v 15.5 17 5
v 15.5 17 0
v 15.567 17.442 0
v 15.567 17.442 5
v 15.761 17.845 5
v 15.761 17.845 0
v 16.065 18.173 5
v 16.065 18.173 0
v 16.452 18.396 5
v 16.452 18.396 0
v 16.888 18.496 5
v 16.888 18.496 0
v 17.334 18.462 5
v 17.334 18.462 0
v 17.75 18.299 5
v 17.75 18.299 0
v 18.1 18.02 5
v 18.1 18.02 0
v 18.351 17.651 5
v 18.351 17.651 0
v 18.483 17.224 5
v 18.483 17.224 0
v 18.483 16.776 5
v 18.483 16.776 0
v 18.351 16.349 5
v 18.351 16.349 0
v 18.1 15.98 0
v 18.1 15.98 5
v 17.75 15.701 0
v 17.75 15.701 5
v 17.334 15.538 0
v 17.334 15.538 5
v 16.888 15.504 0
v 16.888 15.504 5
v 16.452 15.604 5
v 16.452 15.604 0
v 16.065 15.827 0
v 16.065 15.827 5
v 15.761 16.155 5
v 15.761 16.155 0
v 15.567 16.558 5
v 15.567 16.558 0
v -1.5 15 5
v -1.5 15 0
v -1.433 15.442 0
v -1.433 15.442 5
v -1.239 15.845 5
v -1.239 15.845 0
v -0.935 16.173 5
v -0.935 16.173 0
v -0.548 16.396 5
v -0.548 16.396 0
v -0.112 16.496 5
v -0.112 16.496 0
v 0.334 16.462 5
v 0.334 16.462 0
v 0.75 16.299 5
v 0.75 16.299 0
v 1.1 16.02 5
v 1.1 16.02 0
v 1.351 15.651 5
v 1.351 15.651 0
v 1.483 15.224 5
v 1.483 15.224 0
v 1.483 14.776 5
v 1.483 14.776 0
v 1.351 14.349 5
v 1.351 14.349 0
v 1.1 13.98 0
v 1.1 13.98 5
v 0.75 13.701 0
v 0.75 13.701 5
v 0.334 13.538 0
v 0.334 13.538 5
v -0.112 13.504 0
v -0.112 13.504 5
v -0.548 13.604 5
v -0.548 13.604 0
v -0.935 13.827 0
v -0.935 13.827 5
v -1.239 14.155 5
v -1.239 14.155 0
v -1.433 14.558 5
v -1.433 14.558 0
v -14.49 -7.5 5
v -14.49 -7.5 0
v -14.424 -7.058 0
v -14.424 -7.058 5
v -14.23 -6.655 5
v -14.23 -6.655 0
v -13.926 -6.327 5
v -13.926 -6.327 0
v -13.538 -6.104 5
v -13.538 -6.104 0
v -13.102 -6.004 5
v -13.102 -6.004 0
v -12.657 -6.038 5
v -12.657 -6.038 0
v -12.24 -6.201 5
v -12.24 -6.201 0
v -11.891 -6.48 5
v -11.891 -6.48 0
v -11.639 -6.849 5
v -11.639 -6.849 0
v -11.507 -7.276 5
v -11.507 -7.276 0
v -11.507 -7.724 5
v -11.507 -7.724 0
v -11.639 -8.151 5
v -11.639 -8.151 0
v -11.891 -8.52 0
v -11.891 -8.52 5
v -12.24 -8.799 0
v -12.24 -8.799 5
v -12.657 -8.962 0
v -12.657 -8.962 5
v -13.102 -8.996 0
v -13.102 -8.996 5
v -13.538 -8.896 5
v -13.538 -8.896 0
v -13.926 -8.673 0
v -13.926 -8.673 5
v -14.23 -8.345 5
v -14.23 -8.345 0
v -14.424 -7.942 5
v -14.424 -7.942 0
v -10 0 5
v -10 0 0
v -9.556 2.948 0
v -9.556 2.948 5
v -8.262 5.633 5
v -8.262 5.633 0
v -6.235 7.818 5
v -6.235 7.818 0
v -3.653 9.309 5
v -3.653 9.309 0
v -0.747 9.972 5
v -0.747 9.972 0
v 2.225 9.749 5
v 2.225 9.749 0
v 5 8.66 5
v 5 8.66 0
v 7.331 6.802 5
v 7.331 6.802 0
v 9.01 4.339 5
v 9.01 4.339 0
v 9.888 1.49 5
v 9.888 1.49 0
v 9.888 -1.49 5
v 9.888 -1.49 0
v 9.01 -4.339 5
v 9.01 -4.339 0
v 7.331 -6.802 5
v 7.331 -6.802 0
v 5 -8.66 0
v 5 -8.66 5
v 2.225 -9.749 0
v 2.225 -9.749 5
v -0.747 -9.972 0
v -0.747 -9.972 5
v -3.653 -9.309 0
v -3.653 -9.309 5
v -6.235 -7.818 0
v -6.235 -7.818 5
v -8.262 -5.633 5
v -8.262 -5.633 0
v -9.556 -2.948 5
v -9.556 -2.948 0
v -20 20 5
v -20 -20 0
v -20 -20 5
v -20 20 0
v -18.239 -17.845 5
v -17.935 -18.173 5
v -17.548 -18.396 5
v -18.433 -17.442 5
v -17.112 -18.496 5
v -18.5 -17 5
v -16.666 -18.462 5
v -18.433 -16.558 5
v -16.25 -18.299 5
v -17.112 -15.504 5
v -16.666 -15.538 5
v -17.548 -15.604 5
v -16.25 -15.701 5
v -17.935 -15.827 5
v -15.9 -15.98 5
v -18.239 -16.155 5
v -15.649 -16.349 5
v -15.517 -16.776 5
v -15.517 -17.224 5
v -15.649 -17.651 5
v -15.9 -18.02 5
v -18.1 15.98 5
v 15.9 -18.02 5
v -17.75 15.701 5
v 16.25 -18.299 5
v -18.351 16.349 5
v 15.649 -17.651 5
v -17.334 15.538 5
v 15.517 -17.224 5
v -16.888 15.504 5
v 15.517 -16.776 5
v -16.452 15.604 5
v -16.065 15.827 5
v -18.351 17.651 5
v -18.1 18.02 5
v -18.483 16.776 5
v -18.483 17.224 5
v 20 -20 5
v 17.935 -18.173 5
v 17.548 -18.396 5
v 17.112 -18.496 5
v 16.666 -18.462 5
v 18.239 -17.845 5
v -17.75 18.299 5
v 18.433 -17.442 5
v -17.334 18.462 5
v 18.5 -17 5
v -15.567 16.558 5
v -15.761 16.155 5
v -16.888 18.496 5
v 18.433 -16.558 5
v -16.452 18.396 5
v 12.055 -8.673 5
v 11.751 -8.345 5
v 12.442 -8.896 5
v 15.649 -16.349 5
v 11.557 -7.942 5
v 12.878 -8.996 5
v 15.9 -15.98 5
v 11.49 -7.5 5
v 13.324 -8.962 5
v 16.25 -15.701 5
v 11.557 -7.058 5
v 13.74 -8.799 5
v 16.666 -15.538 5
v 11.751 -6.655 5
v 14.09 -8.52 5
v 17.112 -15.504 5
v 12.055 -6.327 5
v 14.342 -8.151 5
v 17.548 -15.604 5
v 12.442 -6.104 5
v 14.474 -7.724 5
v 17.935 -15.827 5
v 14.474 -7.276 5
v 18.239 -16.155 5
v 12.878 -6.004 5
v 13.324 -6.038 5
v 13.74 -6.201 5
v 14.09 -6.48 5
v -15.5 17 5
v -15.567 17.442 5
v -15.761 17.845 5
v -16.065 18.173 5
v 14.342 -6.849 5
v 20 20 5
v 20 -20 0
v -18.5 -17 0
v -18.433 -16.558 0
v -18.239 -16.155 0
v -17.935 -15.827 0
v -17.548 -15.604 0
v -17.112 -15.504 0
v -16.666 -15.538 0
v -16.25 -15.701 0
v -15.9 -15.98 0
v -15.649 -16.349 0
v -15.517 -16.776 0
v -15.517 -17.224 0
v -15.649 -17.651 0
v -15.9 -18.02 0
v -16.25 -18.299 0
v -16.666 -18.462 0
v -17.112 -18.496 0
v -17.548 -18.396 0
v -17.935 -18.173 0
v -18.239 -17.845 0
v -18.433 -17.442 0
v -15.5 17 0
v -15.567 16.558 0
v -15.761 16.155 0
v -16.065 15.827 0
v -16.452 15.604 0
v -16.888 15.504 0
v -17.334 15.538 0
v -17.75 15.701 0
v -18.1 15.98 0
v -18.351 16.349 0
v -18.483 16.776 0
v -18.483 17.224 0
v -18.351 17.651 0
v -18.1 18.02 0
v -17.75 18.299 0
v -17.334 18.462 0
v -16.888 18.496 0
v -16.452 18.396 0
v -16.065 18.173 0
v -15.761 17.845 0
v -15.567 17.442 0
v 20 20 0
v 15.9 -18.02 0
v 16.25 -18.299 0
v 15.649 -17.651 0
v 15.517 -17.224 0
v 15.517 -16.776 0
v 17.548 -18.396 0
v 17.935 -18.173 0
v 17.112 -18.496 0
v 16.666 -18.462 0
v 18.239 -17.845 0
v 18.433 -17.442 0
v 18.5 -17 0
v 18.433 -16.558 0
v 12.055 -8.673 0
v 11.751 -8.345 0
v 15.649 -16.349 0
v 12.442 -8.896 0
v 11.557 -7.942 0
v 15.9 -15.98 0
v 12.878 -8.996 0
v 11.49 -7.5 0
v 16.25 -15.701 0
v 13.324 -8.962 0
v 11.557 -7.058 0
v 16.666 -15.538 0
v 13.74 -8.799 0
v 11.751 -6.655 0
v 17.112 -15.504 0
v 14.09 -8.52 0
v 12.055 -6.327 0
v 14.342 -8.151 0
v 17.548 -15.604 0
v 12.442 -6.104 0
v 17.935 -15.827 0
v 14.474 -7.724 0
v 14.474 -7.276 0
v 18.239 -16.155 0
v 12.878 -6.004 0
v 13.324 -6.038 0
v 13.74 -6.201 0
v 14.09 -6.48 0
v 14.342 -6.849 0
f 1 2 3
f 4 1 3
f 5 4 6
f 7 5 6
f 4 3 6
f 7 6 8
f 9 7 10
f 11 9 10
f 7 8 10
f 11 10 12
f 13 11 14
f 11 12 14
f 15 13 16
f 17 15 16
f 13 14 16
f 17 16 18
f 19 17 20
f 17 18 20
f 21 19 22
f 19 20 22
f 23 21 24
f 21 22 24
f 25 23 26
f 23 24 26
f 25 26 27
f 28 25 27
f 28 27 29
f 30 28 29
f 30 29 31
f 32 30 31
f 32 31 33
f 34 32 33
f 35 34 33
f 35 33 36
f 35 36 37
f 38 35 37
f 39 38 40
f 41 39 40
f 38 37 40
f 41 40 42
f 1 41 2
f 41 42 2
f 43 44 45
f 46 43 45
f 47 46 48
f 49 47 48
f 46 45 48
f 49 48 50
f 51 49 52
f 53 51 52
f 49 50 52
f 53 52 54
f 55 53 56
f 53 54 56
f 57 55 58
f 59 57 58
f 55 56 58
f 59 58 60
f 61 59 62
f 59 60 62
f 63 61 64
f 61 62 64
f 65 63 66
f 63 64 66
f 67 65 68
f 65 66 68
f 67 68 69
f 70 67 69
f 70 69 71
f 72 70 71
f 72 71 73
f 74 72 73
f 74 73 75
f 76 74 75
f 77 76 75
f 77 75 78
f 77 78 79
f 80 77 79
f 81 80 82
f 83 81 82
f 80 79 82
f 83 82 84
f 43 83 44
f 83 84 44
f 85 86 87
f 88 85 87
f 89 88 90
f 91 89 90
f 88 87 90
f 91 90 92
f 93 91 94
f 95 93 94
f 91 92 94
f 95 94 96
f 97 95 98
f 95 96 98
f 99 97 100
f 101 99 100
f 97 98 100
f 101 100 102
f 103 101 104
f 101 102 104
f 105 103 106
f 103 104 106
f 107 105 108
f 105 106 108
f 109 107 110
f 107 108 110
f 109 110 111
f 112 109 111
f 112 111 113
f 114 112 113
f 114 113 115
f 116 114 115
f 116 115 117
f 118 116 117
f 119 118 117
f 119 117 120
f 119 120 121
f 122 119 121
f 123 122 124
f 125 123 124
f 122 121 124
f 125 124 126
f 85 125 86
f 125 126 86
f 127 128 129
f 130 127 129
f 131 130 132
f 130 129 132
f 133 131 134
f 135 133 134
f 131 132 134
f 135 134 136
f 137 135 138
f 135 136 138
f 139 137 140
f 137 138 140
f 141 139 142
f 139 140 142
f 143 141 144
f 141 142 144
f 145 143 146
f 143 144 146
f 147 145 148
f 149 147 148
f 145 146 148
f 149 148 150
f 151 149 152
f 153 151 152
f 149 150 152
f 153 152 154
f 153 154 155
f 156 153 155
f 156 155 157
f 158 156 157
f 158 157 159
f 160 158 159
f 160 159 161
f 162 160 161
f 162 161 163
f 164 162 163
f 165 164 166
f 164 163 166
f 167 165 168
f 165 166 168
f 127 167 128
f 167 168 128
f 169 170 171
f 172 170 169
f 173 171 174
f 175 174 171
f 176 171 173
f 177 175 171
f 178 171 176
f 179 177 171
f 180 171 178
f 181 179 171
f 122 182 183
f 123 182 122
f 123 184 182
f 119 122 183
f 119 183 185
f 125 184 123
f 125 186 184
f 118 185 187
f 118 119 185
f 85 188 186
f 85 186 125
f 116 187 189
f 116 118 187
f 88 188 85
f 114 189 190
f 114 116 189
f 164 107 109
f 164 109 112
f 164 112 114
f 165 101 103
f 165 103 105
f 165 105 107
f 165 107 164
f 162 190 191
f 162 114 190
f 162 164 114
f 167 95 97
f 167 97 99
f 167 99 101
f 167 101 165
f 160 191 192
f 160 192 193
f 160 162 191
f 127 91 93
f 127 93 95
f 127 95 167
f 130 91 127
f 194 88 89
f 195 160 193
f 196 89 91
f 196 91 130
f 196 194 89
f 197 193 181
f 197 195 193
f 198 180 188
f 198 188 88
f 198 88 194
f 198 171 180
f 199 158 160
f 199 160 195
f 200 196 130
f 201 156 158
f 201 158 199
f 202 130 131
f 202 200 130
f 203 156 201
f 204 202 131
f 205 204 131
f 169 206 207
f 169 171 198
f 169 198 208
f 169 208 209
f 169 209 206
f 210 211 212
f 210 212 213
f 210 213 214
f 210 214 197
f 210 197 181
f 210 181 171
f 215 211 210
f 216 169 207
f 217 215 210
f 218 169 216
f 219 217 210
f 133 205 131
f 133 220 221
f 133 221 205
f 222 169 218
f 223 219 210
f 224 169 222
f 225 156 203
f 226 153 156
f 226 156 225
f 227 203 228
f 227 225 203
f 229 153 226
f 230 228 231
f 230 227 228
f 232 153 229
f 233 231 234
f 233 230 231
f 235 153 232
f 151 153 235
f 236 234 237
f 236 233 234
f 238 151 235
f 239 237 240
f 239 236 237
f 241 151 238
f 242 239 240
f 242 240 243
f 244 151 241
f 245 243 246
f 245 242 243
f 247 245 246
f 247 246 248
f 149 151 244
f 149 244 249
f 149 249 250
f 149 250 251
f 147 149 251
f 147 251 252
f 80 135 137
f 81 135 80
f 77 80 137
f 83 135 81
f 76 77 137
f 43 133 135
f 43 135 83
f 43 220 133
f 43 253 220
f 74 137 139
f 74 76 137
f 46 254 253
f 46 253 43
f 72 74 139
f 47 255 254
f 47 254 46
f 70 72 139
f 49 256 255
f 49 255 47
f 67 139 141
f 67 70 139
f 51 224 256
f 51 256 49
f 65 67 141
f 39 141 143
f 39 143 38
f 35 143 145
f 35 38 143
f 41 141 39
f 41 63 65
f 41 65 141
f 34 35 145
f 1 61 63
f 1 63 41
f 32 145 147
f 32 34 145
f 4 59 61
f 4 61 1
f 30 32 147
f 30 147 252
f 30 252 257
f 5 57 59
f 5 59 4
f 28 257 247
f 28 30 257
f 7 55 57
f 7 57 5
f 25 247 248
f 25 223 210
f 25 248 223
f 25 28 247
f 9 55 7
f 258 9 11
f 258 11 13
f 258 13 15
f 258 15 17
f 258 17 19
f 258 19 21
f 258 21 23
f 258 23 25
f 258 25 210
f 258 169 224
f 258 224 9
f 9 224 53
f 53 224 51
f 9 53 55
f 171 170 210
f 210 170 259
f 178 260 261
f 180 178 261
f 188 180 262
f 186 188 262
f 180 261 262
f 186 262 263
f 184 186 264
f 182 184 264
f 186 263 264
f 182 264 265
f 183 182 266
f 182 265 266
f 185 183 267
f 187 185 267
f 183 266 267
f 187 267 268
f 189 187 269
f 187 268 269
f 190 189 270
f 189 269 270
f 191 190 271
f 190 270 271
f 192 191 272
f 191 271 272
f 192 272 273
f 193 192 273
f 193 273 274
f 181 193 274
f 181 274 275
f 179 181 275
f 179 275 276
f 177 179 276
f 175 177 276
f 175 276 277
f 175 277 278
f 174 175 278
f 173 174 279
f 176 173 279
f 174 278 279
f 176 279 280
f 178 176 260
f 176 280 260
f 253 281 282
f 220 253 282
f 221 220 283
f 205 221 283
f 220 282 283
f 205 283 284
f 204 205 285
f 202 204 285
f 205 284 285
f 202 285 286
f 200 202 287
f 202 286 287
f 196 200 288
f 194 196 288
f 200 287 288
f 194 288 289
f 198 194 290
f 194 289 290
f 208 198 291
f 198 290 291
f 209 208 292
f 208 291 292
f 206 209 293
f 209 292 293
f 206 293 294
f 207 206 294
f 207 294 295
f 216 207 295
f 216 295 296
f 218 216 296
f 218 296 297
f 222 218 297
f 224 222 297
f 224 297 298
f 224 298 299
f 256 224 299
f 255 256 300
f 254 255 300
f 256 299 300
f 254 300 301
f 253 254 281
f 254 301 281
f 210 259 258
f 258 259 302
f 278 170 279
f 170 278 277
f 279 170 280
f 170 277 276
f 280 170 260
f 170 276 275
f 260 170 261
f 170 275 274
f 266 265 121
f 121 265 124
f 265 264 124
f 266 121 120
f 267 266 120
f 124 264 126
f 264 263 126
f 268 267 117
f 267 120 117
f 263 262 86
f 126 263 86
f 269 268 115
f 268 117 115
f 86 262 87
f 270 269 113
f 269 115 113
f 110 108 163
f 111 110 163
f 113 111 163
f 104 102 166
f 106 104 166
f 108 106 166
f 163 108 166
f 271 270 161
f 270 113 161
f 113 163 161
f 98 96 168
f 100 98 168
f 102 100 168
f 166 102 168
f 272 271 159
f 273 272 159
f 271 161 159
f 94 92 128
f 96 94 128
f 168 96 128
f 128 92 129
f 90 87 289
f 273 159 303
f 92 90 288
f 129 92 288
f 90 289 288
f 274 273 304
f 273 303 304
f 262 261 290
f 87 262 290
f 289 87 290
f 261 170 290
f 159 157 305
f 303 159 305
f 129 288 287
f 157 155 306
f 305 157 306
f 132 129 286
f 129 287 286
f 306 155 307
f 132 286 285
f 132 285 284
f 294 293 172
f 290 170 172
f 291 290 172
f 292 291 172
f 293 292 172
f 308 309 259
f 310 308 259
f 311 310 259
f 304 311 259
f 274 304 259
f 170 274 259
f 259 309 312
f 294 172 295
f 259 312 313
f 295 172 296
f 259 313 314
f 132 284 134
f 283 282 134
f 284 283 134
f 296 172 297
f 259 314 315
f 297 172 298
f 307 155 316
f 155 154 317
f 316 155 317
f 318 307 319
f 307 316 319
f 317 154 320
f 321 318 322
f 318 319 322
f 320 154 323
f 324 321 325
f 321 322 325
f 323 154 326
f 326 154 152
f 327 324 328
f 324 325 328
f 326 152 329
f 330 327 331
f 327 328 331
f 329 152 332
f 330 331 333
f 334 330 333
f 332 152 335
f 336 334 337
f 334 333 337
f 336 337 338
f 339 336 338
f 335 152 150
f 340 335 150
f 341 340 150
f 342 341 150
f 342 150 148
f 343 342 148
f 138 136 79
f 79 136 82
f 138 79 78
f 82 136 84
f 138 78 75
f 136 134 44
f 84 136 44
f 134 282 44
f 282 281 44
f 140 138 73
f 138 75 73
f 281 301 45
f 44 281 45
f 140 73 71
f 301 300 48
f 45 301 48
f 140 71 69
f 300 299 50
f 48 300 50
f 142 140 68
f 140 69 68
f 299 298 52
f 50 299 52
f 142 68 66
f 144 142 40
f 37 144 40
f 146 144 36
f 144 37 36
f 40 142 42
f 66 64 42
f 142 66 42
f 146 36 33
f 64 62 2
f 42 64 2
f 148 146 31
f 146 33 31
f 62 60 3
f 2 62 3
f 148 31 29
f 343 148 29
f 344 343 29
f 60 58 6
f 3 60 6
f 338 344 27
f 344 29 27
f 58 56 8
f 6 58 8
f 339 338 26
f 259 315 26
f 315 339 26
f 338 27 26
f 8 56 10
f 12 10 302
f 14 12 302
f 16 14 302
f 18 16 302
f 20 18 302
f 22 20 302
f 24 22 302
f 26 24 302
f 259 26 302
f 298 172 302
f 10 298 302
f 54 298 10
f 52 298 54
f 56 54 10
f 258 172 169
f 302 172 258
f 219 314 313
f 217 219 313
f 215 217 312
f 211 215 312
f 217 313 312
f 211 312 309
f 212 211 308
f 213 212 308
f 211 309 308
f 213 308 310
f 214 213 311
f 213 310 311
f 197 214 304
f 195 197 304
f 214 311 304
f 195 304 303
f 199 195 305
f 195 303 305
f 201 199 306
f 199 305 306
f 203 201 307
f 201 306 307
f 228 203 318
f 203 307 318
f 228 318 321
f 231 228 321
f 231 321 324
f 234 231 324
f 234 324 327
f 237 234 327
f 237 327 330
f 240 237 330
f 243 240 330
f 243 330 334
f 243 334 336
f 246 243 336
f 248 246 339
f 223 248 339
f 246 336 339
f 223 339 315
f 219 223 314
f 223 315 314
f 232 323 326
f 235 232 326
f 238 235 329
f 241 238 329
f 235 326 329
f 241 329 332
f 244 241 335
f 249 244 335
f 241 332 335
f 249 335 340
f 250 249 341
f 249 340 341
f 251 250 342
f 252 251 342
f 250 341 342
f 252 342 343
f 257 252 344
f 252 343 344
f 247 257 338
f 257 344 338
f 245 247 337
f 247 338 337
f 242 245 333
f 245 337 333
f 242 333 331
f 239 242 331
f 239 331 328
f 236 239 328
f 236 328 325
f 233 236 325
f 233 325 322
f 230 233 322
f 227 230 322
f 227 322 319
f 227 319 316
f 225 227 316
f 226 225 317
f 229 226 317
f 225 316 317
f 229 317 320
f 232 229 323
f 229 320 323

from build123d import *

# Parameters (mm, degrees)
SKETCH1_W           = 40
SKETCH1_H           = 40
BOSS_EXTRUDE1_DEPTH = 5
SKETCH2_R           = 10
CUT_EXTRUDE1_DEPTH  = 5
SKETCH3_R           = 1.5
CUT_EXTRUDE2_DEPTH  = 5
SKETCH4_R           = 1.5
CUT_EXTRUDE3_DEPTH  = 5


with BuildPart() as part:
    # Sketch1 → Boss-Extrude1 (new body)
    with BuildSketch(Plane.XY):
        Rectangle(SKETCH1_W, SKETCH1_H)
    extrude(amount=BOSS_EXTRUDE1_DEPTH)

    # Sketch2 → Cut-Extrude1 (cut)
    with BuildSketch(Plane(origin=(0, 0, 0), x_dir=(-1, 0, 0), z_dir=(0, 0, -1))):
        Circle(SKETCH2_R)
    extrude(amount=-CUT_EXTRUDE1_DEPTH, mode=Mode.SUBTRACT)

    # Sketch3 → Cut-Extrude2 (cut)
    with BuildSketch(Plane(origin=(0, 0, 0), x_dir=(-1, 0, 0), z_dir=(0, 0, -1))):
        with Locations((0, 15)):
            Circle(SKETCH3_R)
        with Locations((12.990381057, -7.5)):
            Circle(SKETCH3_R)
        with Locations((-12.990381057, -7.5)):
            Circle(SKETCH3_R)
    extrude(amount=-CUT_EXTRUDE2_DEPTH, mode=Mode.SUBTRACT)

    # Sketch4 → Cut-Extrude3 (cut)
    with BuildSketch(Plane(origin=(0, 0, 0), x_dir=(-1, 0, 0), z_dir=(0, 0, -1))):
        with Locations((-17, 17)):
            Circle(SKETCH4_R)
        with Locations(Location((17, 17, 0), (0, 0, 180))):
            Circle(SKETCH4_R)
        with Locations((17, -17)):
            Circle(SKETCH4_R)
        with Locations(Location((-17, -17, 0), (0, 0, 180))):
            Circle(SKETCH4_R)
    extrude(amount=-CUT_EXTRUDE3_DEPTH, mode=Mode.SUBTRACT)


solid = part.part
